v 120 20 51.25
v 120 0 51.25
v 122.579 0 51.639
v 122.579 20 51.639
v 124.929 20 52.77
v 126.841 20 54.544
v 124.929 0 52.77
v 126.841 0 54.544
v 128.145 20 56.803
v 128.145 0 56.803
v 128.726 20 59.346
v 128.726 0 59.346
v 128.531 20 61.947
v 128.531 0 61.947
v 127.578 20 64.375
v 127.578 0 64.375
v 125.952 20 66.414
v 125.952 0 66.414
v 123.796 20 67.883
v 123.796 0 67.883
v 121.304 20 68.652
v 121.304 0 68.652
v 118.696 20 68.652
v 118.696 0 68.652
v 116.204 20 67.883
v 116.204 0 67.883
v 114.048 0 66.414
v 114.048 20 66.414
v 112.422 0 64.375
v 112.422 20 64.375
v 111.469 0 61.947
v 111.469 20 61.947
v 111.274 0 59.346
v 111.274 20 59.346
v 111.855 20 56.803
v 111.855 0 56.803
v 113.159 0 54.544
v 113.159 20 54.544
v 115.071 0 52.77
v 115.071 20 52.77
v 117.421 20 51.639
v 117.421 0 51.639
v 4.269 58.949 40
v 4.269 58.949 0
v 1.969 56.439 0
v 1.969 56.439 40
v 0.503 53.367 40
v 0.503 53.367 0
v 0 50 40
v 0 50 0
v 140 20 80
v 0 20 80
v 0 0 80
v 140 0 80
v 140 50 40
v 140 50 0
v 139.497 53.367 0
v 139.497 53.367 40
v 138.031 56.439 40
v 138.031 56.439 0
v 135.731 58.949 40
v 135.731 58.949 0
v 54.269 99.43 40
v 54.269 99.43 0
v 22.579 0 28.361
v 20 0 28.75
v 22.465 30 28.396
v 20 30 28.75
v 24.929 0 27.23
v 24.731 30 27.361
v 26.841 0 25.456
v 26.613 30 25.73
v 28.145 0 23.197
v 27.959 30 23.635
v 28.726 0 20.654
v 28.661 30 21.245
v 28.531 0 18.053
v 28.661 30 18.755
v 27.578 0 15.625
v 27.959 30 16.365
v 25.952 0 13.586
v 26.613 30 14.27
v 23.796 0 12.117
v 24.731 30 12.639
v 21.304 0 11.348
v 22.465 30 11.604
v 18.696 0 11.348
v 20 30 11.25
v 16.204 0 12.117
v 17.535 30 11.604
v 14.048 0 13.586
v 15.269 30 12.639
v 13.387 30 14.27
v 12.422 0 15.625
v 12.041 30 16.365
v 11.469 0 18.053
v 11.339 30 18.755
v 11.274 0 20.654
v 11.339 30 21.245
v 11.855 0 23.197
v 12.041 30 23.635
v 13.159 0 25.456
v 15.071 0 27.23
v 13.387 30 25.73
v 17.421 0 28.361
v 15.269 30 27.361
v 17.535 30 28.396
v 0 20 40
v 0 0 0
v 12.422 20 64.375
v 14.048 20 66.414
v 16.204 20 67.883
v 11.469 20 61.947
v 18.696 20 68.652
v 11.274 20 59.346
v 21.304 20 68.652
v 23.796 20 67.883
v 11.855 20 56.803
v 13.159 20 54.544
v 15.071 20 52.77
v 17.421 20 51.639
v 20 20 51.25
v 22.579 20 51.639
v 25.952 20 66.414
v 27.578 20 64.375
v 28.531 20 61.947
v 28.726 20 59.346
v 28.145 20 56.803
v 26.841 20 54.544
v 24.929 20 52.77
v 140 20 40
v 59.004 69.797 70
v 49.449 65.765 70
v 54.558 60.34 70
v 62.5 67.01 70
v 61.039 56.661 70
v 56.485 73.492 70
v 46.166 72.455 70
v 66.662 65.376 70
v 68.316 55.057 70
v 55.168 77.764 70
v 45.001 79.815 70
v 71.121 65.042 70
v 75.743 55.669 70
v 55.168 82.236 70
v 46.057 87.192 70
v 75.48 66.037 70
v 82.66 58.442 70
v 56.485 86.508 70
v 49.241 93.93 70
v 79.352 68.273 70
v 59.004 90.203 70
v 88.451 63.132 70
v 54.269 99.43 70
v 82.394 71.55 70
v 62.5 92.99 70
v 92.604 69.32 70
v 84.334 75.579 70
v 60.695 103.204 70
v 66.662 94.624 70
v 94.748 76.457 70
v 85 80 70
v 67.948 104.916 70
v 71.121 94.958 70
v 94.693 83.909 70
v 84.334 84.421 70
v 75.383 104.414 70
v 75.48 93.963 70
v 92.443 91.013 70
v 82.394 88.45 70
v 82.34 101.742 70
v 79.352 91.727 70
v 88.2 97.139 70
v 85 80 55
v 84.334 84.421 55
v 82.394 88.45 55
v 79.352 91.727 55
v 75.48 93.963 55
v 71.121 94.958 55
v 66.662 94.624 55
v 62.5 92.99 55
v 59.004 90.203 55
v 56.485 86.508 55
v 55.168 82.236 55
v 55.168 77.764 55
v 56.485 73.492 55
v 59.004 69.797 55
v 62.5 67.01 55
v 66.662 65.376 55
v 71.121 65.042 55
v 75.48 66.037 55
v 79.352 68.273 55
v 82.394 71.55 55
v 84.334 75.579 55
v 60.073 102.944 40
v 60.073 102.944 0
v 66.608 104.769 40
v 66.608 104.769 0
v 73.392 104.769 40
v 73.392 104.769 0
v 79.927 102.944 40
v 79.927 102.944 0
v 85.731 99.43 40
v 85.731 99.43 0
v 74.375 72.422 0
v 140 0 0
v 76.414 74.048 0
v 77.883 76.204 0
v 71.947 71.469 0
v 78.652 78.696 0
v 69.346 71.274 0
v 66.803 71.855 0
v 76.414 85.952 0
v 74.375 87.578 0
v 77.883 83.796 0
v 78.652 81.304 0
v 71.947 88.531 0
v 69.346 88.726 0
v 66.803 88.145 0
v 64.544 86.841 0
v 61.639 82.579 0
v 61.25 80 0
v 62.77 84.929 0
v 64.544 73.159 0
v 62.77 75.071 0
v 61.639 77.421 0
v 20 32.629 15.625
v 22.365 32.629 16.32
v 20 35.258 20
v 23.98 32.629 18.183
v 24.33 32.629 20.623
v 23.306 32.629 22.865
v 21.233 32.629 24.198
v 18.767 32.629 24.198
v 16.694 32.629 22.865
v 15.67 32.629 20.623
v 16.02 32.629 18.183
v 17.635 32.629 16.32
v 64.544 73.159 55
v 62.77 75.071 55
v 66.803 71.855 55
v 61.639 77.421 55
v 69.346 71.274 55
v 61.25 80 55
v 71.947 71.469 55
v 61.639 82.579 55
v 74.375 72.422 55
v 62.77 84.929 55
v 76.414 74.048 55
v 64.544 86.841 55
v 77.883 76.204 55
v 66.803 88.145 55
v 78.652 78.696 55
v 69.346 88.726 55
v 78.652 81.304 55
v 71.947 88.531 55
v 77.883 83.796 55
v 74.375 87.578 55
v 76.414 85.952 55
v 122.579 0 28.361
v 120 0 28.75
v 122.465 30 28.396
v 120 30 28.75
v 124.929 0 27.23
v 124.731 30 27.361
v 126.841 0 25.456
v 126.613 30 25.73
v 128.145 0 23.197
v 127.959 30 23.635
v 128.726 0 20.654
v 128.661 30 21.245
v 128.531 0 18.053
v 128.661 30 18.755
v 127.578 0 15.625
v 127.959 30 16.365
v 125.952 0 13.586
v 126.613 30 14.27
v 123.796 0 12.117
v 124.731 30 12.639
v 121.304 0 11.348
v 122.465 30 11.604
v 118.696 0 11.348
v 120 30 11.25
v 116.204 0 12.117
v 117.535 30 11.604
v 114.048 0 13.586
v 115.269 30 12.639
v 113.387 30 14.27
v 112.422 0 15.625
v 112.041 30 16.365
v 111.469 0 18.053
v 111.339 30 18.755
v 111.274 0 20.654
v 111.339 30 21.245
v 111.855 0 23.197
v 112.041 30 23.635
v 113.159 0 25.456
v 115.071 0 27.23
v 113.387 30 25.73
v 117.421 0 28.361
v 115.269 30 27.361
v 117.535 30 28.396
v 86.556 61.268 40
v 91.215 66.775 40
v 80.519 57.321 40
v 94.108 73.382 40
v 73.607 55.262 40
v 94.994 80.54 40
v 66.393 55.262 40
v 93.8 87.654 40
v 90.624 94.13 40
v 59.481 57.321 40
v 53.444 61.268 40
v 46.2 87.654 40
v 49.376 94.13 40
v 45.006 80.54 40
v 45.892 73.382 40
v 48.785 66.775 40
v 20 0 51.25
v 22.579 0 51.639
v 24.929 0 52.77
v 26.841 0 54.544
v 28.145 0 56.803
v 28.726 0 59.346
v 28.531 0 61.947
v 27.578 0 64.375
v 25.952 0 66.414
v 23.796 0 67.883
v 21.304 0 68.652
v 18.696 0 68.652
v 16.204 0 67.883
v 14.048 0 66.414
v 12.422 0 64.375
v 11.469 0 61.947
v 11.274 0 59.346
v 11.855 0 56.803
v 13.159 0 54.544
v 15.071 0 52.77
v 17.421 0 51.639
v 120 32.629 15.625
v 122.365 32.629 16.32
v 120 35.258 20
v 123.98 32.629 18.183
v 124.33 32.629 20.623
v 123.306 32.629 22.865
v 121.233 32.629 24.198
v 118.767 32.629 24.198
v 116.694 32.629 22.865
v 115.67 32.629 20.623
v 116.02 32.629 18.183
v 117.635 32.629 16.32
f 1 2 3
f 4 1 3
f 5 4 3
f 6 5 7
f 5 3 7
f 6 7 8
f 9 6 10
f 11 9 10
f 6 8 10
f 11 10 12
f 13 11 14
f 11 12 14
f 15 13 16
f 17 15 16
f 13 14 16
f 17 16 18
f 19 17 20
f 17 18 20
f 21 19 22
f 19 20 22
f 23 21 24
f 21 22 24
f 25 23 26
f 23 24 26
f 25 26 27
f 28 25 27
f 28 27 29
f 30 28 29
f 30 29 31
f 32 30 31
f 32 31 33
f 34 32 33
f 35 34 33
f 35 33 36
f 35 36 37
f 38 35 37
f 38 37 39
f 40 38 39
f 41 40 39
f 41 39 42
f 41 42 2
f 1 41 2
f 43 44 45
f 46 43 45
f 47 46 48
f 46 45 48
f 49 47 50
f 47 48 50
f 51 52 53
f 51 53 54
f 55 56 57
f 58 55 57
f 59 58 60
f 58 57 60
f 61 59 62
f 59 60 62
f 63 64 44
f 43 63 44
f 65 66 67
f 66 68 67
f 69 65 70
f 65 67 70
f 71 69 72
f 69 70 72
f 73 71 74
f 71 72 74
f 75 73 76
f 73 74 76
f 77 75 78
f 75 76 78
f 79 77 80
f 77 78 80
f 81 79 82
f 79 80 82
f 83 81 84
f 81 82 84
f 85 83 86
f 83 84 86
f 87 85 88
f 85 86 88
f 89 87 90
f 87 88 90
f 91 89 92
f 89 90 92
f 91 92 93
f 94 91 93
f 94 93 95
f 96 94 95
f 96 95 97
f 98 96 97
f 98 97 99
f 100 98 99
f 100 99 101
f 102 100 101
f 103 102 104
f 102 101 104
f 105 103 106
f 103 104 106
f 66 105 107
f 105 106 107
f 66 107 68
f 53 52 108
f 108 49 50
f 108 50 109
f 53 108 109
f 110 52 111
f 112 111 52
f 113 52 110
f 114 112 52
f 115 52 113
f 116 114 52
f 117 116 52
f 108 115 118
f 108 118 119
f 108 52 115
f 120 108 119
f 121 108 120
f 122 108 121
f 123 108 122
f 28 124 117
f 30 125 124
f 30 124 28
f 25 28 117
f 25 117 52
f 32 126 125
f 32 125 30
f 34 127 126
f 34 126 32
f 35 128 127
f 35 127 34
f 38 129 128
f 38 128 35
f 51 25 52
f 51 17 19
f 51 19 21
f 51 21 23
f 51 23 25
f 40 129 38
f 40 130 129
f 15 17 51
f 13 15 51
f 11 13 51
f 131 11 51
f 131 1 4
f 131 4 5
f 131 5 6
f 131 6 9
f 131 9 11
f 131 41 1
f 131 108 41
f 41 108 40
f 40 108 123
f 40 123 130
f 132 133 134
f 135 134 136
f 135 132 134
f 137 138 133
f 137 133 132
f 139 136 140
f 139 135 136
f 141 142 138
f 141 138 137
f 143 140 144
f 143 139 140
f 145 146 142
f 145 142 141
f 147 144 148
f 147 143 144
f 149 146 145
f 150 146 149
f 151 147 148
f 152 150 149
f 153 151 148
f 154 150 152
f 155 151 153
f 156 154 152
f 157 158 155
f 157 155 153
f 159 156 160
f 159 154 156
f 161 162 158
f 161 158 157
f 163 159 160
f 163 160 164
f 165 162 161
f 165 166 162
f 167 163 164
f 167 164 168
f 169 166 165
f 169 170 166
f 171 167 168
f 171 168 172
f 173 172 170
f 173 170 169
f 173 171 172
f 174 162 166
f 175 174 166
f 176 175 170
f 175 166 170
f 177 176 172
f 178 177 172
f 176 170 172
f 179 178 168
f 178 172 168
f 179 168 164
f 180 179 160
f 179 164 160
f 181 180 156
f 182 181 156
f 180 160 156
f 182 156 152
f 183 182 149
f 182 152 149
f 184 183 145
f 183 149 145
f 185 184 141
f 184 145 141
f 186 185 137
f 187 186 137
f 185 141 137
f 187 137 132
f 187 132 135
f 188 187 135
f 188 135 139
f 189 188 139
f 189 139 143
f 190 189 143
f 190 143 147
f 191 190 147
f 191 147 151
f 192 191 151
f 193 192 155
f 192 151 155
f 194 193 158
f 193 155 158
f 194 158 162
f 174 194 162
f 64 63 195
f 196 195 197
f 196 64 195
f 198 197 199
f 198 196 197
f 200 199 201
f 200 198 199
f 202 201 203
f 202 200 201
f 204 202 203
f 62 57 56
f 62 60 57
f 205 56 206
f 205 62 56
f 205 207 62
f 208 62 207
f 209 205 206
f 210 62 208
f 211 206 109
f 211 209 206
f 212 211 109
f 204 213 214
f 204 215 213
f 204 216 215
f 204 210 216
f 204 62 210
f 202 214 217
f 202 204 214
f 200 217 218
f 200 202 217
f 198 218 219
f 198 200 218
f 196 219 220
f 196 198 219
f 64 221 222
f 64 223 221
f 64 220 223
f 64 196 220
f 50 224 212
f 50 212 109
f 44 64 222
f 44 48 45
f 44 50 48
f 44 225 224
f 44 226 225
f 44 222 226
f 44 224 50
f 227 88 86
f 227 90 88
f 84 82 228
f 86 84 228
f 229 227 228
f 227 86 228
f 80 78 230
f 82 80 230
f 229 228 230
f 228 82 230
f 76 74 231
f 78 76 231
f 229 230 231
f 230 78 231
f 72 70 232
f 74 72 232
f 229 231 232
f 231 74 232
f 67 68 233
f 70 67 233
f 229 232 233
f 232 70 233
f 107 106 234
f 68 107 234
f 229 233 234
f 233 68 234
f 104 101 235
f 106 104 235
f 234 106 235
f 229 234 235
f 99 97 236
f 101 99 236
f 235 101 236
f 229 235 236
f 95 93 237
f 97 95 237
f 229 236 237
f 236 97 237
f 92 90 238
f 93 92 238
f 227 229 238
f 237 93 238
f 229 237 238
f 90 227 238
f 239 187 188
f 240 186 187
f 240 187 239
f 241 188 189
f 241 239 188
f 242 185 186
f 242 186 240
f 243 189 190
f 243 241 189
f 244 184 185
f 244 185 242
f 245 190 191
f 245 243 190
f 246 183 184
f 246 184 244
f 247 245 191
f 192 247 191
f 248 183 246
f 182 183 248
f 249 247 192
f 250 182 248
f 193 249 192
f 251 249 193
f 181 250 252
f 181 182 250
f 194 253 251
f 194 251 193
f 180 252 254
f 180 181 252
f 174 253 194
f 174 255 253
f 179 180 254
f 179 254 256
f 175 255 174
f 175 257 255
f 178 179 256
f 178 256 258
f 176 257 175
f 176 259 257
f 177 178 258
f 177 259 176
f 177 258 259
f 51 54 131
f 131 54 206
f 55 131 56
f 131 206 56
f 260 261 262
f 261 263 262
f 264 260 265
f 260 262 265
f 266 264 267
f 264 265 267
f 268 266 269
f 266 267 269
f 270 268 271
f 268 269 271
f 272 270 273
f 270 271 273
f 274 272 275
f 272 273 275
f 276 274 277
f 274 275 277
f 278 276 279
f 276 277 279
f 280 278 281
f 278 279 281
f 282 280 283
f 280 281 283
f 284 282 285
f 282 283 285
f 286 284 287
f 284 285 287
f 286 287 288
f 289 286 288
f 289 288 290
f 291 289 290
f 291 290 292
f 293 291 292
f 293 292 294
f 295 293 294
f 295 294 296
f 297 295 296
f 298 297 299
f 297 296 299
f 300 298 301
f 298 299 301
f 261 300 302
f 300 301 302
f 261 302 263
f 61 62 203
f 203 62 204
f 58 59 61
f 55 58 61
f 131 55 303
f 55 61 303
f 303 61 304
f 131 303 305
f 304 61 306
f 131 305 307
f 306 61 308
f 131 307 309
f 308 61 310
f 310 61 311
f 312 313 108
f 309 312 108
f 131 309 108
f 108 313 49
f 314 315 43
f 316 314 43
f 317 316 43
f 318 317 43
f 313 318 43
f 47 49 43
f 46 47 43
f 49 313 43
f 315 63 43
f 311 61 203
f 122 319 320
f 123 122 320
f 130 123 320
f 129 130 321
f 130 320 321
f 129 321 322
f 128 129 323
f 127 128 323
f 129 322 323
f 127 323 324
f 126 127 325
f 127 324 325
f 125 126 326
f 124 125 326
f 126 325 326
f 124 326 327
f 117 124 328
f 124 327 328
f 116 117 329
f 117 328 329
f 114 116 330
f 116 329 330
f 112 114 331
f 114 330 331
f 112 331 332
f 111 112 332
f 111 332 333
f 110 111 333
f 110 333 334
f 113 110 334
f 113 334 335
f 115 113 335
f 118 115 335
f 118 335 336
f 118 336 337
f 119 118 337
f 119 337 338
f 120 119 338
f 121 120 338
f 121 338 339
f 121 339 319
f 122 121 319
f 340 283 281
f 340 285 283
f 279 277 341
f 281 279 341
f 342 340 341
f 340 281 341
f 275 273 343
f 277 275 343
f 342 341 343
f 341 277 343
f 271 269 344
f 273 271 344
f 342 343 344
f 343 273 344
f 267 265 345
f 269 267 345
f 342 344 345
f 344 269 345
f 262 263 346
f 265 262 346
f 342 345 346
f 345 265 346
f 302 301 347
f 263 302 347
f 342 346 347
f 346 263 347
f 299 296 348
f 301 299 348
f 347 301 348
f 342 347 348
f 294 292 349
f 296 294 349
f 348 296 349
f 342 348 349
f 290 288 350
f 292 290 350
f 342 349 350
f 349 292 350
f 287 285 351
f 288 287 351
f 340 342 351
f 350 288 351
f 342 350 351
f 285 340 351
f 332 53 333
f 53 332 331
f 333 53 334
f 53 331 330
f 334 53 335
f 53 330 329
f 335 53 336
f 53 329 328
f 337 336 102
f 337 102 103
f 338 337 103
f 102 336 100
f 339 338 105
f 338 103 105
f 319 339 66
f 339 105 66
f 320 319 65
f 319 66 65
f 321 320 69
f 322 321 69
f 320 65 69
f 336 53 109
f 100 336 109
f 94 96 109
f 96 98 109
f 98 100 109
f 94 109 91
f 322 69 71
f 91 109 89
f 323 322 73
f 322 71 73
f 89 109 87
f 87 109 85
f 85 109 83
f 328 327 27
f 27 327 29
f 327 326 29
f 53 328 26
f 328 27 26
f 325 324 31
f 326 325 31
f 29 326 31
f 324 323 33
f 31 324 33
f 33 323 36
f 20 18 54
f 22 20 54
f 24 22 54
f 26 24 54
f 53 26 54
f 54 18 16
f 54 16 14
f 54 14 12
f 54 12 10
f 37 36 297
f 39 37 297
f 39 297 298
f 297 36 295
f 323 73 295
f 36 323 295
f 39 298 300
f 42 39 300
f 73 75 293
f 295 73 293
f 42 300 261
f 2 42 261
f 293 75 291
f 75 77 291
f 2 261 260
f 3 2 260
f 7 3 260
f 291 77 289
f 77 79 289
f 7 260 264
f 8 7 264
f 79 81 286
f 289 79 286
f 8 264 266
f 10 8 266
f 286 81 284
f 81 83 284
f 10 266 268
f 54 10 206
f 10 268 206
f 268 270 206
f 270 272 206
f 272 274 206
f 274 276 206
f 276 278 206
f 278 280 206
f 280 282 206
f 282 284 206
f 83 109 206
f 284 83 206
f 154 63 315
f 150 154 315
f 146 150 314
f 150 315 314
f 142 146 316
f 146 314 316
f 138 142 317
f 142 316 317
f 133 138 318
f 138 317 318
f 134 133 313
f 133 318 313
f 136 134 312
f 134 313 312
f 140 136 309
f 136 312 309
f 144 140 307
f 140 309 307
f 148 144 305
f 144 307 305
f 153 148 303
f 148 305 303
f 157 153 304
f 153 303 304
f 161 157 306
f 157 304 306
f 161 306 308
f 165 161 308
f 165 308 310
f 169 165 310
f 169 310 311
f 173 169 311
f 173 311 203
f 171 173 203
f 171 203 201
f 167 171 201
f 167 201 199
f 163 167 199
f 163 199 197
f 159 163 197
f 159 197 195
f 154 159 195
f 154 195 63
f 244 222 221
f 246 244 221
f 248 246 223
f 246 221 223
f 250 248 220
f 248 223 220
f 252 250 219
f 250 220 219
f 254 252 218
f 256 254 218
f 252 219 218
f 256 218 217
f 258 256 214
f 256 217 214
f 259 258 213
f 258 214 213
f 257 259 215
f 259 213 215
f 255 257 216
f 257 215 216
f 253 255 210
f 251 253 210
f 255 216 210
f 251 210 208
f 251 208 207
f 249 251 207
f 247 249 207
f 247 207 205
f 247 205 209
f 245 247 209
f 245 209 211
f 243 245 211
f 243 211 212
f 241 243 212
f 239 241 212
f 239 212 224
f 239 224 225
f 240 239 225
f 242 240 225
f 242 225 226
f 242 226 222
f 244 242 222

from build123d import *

# Parameters (mm, degrees)
BOSS_EXTRUDE1_DEPTH    = 80
SKETCH2_R              = 25
BOSS_EXTRUDE2_DEPTH    = 40
CUT_EXTRUDE2_DEPTH     = 40
M20_TAPPED_HOLE2_D     = 17.5
M20_TAPPED_HOLE2_DEPTH = 30
M20_TAPPED_HOLE2_TIP   = 5.257530416
SKETCH9_W              = 140
SKETCH9_H              = 40
CUT_EXTRUDE3_DEPTH     = 110
M20_TAPPED_HOLE3_D     = 17.5
M20_TAPPED_HOLE3_DEPTH = 37.5
M20_TAPPED_HOLE3_TIP   = 5.257530416
SKETCH14_R             = 25
SKETCH14_R_2           = 15
BOSS_EXTRUDE3_DEPTH    = 30
SKETCH15_R             = 15
BOSS_EXTRUDE4_DEPTH    = 30
SKETCH16_R             = 15
CUT_EXTRUDE4_DEPTH     = 15
M20_TAPPED_HOLE4_D     = 17.5
M20_TAPPED_HOLE4_DEPTH = 60
M20_TAPPED_HOLE4_TIP   = 5.257530416


with BuildPart() as part:
    # Sketch1 → Boss-Extrude1 (new body)
    with BuildSketch(Plane.XY):
        with BuildLine():
            Line((54.268808187, 99.430121053), (4.268808187, 58.948665044))
            ThreePointArc((4.268808187, 58.948665044), (1.121855986, 54.957351344), (0, 50))
            Line((0, 50), (0, 0))
            Line((0, 0), (140, 0))
            Line((140, 0), (140, 50))
            ThreePointArc((140, 50), (138.878144014, 54.957351344), (135.731191813, 58.948665044))
            Line((135.731191813, 58.948665044), (85.731191813, 99.430121053))
            ThreePointArc((85.731191813, 99.430121053), (92.56412856, 90.763833069), (95, 80))
            ThreePointArc((95, 80), (59.236166931, 57.43587144), (54.268808187, 99.430121053))
        make_face()
    extrude(amount=BOSS_EXTRUDE1_DEPTH)

    # Sketch2 → Boss-Extrude2 (add)
    with BuildSketch(Plane(origin=(0, 0, 0), x_dir=(-1, 0, 0), z_dir=(0, 0, -1))):
        with Locations((-70, 80)):
            Circle(SKETCH2_R)
    extrude(amount=-BOSS_EXTRUDE2_DEPTH)

    # Sketch3 → Cut-Extrude2 (cut)
    with BuildSketch(Plane.XY.offset(80)):
        with BuildLine():
            ThreePointArc((54.268808187, 99.430121053), (47.43587144, 90.763833069), (45, 80))
            Line((45, 80), (95, 80))
            ThreePointArc((95, 80), (92.56412856, 90.763833069), (85.731191813, 99.430121053))
            Line((85.731191813, 99.430121053), (95, 91.925824036))
            Line((95, 91.925824036), (95, 118.127818218))
            Line((95, 118.127818218), (45, 118.127818218))
            Line((45, 118.127818218), (45, 91.925824036))
            Line((45, 91.925824036), (54.268808187, 99.430121053))
        make_face()
        with BuildLine():
            Line((45, 91.925824036), (45, 80))
            ThreePointArc((45, 80), (47.43587144, 90.763833069), (54.268808187, 99.430121053))
            Line((54.268808187, 99.430121053), (45, 91.925824036))
        make_face()
        with BuildLine():
            ThreePointArc((85.731191813, 99.430121053), (92.56412856, 90.763833069), (95, 80))
            Line((95, 80), (95, 91.925824036))
            Line((95, 91.925824036), (85.731191813, 99.430121053))
        make_face()
    extrude(amount=-CUT_EXTRUDE2_DEPTH, mode=Mode.SUBTRACT)

    # M20 Tapped Hole2
    with Locations(Plane(origin=(20, 0, 20), x_dir=(0, 0, -1), z_dir=(0, -1, 0))):
        with Locations((0, 0), (0, 100)):
            Hole(M20_TAPPED_HOLE2_D / 2, depth=M20_TAPPED_HOLE2_DEPTH)
            with Locations((0, 0, -(M20_TAPPED_HOLE2_DEPTH + M20_TAPPED_HOLE2_TIP / 2))):  # 118° drill point
                Cone(0, M20_TAPPED_HOLE2_D / 2, M20_TAPPED_HOLE2_TIP, mode=Mode.SUBTRACT)

    # Sketch9 → Cut-Extrude3 (cut)
    with BuildSketch(Plane(origin=(0, 20, 0), x_dir=(1, 0, 0), z_dir=(0, 1, 0))):
        with Locations((70, -60)):
            Rectangle(SKETCH9_W, SKETCH9_H)
    extrude(amount=CUT_EXTRUDE3_DEPTH, mode=Mode.SUBTRACT)

    # M20 Tapped Hole3
    with Locations(Plane(origin=(20, 20, 60), x_dir=(0, 0, 1), z_dir=(0, 1, 0))):
        with Locations((0, 0), (0, 100)):
            Hole(M20_TAPPED_HOLE3_D / 2, depth=M20_TAPPED_HOLE3_DEPTH)
            with Locations((0, 0, -(M20_TAPPED_HOLE3_DEPTH + M20_TAPPED_HOLE3_TIP / 2))):  # 118° drill point
                Cone(0, M20_TAPPED_HOLE3_D / 2, M20_TAPPED_HOLE3_TIP, mode=Mode.SUBTRACT)

    # Sketch14 → Boss-Extrude3 (add)
    with BuildSketch(Plane.XY.offset(40)):
        with Locations(Location((70, 80, 0), (0, 0, 128.994638965))):
            Circle(SKETCH14_R)
        with Locations((70, 80)):
            Circle(SKETCH14_R_2, mode=Mode.SUBTRACT)
    extrude(amount=BOSS_EXTRUDE3_DEPTH)

    # Sketch15 → Boss-Extrude4 (add)
    with BuildSketch(Plane.XY.offset(40)):
        with Locations((70, 80)):
            Circle(SKETCH15_R)
    extrude(amount=BOSS_EXTRUDE4_DEPTH)

    # Sketch16 → Cut-Extrude4 (cut)
    with BuildSketch(Plane.XY.offset(70)):
        with Locations((70, 80)):
            Circle(SKETCH16_R)
    extrude(amount=-CUT_EXTRUDE4_DEPTH, mode=Mode.SUBTRACT)

    # M20 Tapped Hole4
    with Locations(Plane(origin=(70, 80, 55), x_dir=(1, 0, 0), z_dir=(0, 0, 1))):
        with Locations((0, 0)):
            Hole(M20_TAPPED_HOLE4_D / 2, depth=M20_TAPPED_HOLE4_DEPTH)
            with Locations((0, 0, -(M20_TAPPED_HOLE4_DEPTH + M20_TAPPED_HOLE4_TIP / 2))):  # 118° drill point
                Cone(0, M20_TAPPED_HOLE4_D / 2, M20_TAPPED_HOLE4_TIP, mode=Mode.SUBTRACT)


solid = part.part
